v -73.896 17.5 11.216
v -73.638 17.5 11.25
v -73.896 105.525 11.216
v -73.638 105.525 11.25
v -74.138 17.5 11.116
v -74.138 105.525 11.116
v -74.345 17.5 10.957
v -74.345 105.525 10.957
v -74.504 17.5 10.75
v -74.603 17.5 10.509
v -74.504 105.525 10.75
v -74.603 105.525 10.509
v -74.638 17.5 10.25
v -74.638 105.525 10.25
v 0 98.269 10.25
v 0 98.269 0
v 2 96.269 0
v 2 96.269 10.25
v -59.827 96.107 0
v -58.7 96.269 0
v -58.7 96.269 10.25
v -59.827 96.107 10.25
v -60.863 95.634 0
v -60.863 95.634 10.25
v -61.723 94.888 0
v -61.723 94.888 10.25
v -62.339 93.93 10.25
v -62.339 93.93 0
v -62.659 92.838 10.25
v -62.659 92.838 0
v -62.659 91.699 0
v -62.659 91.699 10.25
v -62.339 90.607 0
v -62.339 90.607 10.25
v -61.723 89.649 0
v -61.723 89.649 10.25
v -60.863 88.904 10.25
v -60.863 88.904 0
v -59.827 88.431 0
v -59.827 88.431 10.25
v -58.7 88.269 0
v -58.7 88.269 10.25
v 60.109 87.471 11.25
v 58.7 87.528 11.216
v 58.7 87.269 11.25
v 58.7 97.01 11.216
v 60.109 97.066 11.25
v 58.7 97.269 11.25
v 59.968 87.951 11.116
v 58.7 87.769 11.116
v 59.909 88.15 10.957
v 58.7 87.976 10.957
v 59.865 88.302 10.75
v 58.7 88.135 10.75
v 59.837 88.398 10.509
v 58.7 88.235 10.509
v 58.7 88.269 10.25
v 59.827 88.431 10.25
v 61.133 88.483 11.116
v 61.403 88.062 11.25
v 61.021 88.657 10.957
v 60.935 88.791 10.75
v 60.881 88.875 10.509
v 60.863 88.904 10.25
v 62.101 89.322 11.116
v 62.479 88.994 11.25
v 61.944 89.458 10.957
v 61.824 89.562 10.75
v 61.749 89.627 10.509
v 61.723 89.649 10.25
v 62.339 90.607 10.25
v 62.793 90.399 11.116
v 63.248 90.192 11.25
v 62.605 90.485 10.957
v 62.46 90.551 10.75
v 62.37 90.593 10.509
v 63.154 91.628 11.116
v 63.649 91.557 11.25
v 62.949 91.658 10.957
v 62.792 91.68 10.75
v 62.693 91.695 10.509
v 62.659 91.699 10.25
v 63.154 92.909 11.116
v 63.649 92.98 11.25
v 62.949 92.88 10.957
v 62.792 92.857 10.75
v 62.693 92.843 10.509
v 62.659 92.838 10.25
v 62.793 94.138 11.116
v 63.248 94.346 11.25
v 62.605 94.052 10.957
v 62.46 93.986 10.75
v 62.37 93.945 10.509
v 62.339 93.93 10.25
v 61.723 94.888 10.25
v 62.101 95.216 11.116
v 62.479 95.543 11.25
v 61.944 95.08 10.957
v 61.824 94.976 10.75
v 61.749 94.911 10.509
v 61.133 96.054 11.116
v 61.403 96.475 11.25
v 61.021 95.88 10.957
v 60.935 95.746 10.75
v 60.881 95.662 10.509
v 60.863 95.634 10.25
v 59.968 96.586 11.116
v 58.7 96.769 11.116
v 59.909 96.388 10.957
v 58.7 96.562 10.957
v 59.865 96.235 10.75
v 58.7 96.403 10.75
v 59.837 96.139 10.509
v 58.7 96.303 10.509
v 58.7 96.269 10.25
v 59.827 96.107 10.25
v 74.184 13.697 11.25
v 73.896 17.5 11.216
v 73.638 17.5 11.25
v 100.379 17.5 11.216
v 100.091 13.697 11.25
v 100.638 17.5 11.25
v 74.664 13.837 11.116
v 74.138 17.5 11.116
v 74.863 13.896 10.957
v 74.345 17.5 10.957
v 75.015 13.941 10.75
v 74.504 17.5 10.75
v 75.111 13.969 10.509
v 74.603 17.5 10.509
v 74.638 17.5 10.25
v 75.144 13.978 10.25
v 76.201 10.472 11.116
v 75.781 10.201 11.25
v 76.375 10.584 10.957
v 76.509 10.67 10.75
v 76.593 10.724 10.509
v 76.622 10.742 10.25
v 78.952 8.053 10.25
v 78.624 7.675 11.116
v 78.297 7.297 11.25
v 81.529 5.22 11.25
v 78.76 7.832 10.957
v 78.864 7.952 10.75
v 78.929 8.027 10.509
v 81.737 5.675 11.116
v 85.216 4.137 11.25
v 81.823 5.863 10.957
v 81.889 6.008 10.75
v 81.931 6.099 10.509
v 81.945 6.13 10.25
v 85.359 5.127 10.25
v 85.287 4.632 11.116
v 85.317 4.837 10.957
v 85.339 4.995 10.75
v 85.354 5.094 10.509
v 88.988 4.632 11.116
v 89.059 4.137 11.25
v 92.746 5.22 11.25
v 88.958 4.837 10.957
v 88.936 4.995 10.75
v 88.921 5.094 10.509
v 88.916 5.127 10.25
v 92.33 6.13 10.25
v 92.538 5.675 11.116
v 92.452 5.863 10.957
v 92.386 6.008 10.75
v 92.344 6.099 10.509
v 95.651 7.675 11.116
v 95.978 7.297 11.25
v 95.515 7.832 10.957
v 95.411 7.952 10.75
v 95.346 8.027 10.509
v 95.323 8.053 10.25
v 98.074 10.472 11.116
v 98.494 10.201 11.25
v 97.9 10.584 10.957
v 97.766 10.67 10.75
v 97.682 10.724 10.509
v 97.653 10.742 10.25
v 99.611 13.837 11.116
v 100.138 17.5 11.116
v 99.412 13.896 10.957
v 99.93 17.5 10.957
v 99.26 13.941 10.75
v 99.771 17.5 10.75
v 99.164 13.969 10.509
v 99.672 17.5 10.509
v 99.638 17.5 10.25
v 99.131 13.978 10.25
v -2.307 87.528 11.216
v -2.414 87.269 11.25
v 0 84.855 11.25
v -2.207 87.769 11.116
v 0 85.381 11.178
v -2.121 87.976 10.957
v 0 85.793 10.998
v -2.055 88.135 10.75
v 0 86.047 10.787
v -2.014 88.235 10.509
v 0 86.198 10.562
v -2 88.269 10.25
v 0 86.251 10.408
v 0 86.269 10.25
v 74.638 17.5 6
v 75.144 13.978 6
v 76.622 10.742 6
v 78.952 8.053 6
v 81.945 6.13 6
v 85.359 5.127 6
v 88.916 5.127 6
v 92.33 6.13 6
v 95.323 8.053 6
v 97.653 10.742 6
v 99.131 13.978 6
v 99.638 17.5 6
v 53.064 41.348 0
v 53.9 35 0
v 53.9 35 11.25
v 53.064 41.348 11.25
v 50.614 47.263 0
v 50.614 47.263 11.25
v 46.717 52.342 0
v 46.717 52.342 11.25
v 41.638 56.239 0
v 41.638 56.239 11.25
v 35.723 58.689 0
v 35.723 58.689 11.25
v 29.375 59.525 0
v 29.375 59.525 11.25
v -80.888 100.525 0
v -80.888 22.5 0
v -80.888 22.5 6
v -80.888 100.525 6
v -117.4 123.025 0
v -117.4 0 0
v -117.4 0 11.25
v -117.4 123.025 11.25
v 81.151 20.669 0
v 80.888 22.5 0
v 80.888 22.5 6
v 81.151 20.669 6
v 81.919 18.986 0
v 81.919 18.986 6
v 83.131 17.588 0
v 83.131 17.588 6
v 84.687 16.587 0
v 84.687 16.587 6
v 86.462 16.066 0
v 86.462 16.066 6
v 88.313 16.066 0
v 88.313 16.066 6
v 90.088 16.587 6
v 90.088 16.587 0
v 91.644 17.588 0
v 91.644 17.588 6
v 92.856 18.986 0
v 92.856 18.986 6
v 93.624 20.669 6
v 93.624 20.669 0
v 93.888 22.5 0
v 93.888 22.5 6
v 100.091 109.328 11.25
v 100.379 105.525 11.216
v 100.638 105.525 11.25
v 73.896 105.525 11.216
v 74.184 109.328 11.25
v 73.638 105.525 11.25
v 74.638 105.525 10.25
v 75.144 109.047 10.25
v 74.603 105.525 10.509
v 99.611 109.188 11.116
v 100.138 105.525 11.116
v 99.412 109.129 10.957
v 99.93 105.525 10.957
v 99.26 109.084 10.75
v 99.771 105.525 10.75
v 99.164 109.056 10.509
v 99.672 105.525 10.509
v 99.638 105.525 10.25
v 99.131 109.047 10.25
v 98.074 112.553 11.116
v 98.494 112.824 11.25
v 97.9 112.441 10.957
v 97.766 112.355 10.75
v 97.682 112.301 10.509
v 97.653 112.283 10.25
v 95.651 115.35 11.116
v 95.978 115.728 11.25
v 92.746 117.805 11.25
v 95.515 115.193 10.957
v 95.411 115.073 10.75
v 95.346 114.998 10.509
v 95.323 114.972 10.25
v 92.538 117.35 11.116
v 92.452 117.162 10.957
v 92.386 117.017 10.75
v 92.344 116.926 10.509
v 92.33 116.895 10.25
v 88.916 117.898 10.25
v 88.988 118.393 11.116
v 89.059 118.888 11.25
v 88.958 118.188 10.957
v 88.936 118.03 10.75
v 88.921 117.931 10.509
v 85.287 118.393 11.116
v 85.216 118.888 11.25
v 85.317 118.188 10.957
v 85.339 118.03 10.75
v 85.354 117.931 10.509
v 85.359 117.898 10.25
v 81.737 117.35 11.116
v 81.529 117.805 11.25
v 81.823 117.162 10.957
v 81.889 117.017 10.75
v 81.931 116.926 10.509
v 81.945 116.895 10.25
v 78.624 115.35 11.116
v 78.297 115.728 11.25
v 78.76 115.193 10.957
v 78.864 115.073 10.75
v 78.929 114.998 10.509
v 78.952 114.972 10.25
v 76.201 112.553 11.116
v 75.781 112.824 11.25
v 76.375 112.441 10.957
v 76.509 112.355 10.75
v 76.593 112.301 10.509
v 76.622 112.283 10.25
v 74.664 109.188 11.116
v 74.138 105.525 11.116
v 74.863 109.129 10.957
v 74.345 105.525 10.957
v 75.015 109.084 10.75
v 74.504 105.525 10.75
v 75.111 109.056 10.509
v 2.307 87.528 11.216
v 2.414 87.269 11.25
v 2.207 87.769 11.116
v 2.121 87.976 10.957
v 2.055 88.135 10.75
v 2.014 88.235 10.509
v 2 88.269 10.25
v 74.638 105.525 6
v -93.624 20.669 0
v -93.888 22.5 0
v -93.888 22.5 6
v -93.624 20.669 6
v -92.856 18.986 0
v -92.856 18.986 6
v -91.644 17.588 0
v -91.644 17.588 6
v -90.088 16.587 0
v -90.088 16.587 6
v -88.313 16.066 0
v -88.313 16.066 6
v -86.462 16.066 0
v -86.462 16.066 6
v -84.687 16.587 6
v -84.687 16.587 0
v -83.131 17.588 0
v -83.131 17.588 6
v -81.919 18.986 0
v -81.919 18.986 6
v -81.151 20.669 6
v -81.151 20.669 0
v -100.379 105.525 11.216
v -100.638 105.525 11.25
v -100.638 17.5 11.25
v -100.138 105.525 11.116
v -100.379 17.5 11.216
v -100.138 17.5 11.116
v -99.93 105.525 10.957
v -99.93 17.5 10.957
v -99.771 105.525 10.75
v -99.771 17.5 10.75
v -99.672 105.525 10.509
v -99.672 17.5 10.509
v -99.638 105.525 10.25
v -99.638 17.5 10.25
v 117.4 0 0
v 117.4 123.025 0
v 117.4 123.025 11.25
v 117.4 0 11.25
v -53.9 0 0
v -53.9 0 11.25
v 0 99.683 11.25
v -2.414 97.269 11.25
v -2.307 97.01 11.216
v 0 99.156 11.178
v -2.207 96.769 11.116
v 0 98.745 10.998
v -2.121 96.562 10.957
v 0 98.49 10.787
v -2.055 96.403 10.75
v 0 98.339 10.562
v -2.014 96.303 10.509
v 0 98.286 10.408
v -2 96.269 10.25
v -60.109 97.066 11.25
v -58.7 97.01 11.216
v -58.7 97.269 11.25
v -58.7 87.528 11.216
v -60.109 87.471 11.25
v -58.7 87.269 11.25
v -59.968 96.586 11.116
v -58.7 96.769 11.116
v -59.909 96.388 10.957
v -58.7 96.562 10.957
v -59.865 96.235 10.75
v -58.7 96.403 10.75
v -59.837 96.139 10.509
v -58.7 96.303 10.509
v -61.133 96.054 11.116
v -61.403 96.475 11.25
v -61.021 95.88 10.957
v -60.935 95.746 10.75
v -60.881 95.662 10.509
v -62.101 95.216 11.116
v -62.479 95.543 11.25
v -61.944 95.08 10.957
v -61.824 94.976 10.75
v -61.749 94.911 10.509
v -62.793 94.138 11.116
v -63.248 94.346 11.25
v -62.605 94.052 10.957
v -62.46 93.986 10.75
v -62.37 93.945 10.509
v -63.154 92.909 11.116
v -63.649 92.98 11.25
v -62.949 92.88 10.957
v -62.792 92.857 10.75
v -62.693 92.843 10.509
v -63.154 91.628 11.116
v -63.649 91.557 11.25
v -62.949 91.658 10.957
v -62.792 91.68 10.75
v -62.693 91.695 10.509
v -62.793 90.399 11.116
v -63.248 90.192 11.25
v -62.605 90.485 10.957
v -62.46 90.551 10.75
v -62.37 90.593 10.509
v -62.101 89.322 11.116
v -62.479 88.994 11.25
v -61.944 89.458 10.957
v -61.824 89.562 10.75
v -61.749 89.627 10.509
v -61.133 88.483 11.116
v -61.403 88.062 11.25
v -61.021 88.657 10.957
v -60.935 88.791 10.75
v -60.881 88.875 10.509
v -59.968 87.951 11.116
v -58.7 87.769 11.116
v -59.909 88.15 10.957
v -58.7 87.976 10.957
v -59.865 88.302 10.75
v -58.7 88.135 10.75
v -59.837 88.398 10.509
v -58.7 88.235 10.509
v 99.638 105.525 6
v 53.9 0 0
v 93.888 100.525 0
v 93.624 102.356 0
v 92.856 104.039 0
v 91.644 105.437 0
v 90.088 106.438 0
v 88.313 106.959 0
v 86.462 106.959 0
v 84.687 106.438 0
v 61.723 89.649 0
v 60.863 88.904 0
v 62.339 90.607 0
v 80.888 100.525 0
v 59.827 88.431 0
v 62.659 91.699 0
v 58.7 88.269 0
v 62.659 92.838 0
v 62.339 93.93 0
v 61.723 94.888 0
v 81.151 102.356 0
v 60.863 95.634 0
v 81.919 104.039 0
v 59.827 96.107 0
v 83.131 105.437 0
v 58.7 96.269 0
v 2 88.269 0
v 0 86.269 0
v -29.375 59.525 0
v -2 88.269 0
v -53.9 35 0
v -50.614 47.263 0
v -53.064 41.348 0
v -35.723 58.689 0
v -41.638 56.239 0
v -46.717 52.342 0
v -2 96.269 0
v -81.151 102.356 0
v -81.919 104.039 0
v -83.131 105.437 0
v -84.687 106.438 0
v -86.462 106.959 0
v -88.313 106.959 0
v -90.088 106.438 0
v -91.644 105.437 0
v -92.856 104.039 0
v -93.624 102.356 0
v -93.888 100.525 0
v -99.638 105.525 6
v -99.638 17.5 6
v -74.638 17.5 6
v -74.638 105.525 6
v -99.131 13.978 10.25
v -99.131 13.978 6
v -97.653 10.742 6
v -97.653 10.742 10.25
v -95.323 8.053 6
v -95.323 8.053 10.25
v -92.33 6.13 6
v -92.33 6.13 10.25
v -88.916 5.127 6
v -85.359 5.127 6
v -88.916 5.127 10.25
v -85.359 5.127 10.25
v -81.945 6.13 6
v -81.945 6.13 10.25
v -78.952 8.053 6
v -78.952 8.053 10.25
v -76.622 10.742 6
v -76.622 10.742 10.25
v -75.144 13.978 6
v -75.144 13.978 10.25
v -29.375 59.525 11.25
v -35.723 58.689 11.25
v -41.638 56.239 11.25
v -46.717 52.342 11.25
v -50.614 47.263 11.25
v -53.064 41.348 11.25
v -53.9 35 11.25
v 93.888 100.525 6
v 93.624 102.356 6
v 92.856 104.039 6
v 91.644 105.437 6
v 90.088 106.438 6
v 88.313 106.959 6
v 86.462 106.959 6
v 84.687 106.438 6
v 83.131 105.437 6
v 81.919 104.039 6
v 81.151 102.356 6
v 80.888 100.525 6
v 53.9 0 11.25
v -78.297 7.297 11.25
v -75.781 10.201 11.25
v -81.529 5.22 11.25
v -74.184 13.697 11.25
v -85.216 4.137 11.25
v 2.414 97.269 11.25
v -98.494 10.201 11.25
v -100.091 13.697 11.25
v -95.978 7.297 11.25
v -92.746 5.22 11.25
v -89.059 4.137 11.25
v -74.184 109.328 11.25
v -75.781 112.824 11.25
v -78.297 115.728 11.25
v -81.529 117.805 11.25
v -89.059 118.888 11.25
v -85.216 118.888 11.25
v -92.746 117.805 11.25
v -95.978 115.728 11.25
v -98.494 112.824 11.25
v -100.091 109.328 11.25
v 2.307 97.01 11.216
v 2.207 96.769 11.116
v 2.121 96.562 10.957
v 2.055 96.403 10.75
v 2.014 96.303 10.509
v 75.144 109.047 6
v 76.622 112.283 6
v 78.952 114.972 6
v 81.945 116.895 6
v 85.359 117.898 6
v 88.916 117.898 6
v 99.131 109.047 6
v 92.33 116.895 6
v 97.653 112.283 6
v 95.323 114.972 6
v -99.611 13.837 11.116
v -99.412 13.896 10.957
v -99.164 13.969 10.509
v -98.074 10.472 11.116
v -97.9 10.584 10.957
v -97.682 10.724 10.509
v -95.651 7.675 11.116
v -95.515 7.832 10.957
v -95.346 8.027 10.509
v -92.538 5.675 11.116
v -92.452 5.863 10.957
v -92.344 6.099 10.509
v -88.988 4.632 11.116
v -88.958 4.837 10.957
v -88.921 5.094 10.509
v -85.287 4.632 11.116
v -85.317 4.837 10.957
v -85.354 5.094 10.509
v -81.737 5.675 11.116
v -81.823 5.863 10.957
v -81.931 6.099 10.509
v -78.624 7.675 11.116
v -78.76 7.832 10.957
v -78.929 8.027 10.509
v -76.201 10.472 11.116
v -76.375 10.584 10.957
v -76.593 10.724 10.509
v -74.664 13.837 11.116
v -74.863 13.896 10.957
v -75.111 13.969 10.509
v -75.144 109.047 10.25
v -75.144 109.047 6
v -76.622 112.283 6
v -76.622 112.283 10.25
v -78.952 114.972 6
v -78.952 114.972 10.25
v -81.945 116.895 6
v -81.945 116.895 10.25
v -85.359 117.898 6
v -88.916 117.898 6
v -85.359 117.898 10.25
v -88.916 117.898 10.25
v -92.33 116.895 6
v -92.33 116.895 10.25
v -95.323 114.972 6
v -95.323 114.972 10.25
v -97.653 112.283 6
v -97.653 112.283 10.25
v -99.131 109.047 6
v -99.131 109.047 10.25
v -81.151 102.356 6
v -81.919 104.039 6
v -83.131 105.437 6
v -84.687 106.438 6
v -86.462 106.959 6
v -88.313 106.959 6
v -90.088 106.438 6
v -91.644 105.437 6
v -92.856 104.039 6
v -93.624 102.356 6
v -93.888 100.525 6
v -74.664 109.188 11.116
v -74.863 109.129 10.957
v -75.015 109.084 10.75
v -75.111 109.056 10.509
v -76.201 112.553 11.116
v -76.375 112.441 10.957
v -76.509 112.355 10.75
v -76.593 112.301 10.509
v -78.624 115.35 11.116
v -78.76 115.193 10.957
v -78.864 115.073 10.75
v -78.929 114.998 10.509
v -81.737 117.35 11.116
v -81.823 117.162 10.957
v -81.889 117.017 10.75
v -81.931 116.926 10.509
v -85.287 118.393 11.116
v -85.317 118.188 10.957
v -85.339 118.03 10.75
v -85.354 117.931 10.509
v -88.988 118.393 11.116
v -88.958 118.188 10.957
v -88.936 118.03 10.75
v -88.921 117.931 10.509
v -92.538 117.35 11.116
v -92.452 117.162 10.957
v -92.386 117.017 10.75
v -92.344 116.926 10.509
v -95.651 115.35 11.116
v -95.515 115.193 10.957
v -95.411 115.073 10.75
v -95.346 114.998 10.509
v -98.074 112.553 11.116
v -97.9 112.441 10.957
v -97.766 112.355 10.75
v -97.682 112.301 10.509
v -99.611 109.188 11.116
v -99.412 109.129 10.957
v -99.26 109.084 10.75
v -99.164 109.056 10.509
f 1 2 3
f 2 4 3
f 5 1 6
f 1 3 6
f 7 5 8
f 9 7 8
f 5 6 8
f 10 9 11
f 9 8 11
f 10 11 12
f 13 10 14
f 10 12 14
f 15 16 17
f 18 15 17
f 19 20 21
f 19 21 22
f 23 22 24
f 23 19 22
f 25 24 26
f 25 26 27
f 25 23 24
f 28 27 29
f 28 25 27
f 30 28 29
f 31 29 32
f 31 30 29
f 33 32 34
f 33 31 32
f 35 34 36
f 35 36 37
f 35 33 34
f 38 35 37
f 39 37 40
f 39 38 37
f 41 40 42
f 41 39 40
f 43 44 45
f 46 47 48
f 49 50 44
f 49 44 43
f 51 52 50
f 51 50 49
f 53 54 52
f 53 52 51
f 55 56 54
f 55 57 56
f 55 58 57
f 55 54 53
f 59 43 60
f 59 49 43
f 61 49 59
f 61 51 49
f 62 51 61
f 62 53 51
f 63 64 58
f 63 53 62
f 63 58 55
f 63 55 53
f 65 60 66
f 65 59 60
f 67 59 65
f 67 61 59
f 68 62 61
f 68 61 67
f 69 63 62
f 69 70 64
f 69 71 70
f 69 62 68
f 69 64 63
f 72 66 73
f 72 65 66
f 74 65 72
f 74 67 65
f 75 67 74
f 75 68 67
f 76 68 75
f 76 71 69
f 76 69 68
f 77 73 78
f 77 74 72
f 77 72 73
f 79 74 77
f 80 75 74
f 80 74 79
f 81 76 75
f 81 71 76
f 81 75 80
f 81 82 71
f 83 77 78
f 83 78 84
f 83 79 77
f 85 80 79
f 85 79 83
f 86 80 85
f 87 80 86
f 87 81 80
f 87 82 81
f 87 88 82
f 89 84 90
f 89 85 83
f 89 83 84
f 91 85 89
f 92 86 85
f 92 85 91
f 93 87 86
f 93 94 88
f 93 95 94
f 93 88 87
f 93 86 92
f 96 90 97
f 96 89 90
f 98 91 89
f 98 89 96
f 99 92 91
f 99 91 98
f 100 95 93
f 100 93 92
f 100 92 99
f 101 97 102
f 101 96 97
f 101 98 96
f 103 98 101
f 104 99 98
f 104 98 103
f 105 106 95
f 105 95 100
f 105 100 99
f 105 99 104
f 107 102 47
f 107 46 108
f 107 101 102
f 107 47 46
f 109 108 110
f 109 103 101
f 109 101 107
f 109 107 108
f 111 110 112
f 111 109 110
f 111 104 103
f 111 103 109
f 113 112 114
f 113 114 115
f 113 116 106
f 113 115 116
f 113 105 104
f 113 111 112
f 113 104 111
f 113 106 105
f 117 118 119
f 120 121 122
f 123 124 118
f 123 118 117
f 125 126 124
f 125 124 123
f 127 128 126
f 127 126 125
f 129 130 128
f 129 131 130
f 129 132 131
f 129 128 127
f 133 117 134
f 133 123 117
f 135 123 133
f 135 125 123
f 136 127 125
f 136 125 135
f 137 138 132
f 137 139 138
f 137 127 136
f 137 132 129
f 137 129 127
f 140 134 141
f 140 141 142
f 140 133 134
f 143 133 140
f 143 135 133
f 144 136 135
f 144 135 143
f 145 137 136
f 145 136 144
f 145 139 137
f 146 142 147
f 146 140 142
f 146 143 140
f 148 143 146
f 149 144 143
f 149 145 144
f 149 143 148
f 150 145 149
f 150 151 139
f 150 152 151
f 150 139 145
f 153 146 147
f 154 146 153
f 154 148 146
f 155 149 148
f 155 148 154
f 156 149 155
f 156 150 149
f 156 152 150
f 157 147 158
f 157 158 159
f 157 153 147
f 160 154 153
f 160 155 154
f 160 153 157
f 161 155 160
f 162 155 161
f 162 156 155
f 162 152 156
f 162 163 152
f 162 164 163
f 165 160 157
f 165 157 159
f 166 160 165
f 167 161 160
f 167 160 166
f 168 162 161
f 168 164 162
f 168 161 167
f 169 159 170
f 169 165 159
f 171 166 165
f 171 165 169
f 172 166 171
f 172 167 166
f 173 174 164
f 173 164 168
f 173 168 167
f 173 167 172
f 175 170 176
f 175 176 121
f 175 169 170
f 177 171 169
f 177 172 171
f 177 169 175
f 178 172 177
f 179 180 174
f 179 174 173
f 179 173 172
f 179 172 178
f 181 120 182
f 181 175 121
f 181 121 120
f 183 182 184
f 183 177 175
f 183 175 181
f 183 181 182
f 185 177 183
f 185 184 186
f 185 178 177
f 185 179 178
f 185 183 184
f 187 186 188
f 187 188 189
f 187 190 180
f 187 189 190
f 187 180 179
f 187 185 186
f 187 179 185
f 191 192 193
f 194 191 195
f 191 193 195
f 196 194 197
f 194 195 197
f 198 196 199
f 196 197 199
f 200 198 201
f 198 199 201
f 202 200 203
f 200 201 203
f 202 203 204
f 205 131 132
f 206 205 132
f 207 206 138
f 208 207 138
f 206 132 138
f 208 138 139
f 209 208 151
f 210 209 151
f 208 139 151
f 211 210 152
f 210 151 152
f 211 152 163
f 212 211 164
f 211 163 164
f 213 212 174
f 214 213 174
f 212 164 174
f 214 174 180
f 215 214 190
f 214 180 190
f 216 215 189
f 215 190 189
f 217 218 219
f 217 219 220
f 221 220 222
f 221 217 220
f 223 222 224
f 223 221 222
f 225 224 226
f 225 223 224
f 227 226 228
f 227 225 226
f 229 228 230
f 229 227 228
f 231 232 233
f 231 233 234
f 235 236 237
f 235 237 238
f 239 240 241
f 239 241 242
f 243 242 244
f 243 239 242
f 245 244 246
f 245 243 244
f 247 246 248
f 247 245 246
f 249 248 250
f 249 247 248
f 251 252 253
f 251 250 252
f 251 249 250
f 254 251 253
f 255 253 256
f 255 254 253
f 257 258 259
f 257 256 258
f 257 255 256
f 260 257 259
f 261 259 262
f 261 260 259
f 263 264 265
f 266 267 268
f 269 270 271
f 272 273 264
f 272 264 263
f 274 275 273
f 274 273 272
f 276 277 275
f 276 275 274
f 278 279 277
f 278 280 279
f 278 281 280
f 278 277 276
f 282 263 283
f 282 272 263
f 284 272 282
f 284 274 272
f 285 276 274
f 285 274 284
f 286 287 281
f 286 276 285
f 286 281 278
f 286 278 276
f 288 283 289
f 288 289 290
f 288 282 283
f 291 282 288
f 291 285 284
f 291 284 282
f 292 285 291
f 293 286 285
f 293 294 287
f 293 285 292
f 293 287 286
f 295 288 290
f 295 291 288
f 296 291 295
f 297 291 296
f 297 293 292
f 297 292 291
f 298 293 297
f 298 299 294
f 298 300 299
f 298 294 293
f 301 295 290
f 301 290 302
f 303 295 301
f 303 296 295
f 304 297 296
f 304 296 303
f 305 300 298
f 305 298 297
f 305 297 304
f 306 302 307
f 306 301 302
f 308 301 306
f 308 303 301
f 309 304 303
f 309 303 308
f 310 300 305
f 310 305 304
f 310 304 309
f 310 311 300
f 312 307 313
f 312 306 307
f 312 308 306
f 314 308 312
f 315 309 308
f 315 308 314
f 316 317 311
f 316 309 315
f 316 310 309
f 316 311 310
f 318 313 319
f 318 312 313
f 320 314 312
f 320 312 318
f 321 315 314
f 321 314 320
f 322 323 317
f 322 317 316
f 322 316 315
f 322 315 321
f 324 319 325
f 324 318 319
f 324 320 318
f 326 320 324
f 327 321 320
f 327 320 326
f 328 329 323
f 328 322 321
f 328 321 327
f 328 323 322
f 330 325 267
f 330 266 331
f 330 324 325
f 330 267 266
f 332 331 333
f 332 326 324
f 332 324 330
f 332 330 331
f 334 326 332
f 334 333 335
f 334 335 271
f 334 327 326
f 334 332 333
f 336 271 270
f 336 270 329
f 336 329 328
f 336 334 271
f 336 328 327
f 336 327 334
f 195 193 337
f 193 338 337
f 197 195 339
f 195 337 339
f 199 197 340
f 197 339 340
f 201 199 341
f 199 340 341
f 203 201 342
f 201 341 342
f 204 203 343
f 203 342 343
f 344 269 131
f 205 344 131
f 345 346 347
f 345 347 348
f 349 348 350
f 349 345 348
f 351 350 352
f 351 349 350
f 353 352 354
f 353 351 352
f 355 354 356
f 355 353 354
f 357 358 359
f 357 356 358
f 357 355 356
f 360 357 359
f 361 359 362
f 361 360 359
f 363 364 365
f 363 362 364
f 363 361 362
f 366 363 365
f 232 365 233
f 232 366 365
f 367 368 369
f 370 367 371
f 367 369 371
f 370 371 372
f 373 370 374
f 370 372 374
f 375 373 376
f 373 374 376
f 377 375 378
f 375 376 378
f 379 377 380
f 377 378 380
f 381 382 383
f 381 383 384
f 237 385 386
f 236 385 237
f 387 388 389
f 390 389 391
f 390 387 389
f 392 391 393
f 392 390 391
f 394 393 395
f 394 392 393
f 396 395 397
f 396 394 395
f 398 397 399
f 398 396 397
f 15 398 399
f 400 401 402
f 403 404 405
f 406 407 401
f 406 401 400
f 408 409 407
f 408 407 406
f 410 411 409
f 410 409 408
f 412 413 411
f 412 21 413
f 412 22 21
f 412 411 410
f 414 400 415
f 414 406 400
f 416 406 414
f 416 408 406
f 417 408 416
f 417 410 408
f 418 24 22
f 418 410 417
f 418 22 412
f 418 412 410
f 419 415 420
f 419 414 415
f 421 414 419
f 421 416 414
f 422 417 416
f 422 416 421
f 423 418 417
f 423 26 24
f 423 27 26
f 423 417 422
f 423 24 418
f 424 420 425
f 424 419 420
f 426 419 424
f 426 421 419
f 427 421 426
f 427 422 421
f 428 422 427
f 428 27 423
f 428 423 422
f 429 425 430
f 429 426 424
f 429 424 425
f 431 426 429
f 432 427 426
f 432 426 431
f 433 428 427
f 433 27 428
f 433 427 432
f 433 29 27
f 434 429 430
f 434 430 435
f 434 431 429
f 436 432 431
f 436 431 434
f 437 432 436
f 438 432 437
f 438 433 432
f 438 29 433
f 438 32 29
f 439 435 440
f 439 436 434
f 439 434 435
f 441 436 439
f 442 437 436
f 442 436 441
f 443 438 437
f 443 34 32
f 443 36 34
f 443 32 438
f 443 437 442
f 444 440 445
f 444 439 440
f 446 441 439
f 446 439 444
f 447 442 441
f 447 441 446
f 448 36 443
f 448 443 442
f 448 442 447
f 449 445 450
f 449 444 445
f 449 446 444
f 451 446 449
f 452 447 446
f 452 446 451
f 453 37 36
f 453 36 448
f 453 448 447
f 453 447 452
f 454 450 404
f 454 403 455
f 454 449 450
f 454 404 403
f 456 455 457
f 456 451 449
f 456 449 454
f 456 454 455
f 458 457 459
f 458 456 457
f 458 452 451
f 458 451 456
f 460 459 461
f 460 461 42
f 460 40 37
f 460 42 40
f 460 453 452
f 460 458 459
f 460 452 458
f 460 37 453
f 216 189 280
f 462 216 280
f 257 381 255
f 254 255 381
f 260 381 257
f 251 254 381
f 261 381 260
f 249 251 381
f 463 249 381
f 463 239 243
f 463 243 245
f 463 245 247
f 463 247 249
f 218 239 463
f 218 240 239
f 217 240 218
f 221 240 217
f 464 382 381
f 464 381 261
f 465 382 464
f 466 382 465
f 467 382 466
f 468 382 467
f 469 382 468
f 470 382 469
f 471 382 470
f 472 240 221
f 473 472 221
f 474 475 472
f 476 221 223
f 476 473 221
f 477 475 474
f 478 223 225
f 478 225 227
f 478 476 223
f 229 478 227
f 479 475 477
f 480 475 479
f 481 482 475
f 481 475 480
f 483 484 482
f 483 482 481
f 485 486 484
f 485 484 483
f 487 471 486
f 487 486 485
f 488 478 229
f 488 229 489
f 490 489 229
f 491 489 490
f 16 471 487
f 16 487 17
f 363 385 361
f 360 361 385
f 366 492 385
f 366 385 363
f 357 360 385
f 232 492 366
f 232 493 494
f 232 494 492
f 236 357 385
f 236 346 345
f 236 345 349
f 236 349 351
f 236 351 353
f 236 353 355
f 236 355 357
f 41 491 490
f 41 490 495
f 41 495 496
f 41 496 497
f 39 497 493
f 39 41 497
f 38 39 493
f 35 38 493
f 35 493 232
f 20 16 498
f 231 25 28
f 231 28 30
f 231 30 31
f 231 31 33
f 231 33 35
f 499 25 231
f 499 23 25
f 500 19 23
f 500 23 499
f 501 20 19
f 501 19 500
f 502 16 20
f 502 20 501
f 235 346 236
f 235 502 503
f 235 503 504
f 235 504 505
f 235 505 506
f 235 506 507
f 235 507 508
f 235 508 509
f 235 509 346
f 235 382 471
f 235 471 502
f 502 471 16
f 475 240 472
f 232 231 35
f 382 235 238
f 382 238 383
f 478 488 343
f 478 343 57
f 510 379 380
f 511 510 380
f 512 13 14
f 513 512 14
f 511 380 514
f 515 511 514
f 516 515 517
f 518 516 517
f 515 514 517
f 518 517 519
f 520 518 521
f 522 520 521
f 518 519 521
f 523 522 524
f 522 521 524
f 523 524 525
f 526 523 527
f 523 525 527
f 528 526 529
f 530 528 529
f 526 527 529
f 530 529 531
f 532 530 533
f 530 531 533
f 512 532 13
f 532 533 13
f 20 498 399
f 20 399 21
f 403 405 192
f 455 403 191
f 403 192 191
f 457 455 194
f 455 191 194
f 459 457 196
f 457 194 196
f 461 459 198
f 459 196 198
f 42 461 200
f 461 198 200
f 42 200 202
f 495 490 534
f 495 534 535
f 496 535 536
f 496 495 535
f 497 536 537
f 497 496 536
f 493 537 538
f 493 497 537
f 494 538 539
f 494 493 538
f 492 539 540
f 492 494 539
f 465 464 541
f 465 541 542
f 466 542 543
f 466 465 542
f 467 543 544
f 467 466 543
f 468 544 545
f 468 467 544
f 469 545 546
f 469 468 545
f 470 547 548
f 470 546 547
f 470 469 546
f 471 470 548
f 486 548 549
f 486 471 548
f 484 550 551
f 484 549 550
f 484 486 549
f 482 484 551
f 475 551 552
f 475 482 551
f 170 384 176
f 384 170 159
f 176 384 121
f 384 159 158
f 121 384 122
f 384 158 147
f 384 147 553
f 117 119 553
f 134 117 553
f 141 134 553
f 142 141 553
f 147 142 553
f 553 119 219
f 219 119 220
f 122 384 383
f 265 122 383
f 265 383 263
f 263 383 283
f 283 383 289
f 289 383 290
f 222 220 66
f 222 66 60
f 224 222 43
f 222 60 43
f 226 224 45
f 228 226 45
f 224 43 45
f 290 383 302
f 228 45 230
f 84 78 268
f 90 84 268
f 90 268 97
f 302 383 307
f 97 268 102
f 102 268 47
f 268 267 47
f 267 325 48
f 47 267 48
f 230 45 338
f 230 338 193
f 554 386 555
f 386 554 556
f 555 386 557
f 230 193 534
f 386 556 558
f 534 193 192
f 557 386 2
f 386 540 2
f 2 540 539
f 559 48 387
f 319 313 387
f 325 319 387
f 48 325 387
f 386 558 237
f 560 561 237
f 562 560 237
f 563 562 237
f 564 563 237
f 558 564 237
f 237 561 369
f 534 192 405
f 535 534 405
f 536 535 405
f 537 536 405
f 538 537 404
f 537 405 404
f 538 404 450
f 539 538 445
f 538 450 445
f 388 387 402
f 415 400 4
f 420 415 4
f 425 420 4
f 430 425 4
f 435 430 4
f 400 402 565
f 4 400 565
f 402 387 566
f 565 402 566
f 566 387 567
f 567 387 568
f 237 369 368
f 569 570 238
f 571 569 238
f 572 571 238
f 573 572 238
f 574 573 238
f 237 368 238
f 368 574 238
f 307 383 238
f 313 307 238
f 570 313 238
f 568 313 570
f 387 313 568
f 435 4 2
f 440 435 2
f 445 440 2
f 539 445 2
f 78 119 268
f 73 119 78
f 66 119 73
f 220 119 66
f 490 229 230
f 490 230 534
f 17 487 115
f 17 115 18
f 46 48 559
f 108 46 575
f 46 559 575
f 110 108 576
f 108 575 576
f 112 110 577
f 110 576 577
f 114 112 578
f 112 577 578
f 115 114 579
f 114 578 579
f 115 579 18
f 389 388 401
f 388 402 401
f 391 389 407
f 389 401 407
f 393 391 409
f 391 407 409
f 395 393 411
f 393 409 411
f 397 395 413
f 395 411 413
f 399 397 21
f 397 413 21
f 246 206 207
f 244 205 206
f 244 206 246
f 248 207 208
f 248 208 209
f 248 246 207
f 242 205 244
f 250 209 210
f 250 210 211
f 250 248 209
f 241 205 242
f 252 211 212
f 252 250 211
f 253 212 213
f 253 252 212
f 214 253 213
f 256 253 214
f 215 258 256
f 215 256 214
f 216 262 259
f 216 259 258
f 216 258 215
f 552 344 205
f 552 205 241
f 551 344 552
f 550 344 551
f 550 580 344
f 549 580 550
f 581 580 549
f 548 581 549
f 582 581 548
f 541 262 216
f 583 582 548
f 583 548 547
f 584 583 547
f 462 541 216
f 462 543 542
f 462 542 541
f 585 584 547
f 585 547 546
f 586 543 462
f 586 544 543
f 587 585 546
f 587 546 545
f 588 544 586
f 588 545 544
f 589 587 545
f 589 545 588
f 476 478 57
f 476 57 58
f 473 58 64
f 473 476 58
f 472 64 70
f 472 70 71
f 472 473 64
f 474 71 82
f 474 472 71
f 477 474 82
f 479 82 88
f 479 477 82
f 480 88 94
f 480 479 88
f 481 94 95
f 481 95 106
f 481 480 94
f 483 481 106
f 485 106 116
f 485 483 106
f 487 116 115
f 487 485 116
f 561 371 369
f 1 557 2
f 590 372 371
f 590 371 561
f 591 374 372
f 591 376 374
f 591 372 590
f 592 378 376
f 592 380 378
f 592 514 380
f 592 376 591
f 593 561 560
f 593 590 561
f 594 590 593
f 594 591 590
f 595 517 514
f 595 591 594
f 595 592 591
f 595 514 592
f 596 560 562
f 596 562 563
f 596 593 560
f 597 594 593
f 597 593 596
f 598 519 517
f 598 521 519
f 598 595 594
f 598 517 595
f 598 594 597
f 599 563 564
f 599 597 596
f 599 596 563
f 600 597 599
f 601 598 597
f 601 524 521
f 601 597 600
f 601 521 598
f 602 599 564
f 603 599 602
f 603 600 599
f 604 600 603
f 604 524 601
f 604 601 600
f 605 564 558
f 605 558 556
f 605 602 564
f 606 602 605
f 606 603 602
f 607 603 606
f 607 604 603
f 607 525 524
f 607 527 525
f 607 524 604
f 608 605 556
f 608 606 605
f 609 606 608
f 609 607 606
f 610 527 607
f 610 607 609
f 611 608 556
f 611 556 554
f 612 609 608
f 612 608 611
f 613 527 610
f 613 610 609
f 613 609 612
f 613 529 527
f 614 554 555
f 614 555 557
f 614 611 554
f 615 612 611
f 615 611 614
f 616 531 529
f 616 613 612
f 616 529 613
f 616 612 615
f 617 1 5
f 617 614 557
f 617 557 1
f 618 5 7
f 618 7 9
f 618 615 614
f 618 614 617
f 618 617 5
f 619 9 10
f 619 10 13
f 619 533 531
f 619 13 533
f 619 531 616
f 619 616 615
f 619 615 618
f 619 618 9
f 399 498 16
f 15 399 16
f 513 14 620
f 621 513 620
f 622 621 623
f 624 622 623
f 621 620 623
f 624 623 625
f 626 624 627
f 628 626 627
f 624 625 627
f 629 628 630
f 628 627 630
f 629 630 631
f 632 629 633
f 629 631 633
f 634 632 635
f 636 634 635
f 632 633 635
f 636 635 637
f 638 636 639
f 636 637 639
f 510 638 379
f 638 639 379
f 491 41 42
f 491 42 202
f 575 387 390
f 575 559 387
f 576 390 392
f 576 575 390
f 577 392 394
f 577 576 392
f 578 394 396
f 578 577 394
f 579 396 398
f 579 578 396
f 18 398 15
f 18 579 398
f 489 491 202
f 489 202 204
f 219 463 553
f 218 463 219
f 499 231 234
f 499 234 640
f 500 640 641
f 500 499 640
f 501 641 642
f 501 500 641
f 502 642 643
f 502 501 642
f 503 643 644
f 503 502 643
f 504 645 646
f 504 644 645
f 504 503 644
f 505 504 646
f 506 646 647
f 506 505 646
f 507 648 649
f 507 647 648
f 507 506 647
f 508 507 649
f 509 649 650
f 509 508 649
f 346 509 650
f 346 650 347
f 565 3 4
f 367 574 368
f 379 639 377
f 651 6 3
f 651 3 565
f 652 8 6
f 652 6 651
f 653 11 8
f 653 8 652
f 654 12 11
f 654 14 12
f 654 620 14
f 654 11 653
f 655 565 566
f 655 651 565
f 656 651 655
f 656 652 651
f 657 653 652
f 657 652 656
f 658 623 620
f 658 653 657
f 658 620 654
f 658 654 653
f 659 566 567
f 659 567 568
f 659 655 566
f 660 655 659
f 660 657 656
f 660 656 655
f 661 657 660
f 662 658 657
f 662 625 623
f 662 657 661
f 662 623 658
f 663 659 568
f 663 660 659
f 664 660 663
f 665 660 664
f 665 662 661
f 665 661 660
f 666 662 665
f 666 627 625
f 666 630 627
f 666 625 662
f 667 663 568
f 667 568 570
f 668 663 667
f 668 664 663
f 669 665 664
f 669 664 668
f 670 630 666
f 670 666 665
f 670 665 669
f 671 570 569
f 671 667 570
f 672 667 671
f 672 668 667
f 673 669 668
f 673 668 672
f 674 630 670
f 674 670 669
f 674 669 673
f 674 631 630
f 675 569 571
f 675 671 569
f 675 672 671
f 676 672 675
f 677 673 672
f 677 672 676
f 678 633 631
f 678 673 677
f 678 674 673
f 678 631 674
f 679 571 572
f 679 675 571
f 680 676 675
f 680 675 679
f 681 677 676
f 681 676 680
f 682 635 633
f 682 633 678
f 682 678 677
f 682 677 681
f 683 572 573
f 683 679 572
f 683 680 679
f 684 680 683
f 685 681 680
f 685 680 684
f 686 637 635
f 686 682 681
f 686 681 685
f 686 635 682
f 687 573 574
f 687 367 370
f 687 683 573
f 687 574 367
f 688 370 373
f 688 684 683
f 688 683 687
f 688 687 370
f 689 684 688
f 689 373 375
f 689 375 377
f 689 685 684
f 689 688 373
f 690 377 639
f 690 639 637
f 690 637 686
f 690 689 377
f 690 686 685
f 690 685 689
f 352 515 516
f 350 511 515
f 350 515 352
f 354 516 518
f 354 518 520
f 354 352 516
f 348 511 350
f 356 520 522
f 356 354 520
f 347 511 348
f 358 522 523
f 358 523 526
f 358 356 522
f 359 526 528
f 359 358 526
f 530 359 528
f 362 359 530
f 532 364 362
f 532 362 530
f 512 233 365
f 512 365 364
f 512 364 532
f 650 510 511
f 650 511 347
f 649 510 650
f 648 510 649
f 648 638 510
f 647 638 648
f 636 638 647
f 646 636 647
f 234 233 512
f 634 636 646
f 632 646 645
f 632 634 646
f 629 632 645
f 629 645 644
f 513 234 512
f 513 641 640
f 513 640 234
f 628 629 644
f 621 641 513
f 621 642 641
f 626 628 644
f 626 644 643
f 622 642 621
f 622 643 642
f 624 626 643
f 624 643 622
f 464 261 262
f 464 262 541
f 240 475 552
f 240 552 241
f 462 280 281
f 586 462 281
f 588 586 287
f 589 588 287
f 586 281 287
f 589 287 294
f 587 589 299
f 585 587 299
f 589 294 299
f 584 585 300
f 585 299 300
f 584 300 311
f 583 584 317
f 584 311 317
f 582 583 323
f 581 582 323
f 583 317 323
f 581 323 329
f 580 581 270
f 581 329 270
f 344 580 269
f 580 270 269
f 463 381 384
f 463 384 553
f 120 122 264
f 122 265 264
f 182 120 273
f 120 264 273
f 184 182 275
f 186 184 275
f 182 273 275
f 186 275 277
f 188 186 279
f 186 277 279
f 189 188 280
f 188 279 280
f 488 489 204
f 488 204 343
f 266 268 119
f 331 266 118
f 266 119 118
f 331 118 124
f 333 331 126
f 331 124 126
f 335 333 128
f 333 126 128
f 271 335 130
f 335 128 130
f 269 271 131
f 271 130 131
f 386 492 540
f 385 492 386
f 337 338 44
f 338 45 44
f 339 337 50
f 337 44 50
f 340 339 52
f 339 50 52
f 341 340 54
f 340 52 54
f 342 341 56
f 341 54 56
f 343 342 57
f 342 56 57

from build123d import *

# Parameters (mm, degrees)
PAD_DEPTH    = 11.25
POCKET_DEPTH = 5.25
FILLET_R     = 1


with BuildPart() as part:
    # Sketch → Pad (new body)
    with BuildSketch(Plane.XY):
        with BuildLine():
            Line((117.4, 123.025), (117.4, 0))
            Line((117.4, 0), (53.9, 0))
            Line((53.9, 0), (53.9, 35))
            ThreePointArc((53.9, 35), (46.716794, 52.341794), (29.375, 59.525))
            Line((29.375, 59.525), (-29.375, 59.525))
            ThreePointArc((-29.375, 59.525), (-46.716794, 52.341794), (-53.9, 35))
            Line((-53.9, 35), (-53.9, 0))
            Line((-53.9, 0), (-117.4, 0))
            Line((-117.4, 0), (-117.4, 123.025))
            Line((-117.4, 123.025), (117.4, 123.025))
        make_face()
        with BuildLine():
            ThreePointArc((-80.8875, 100.525), (-87.3875, 107.025), (-93.8875, 100.525))
            Line((-93.8875, 100.525), (-93.8875, 22.5))
            ThreePointArc((-93.8875, 22.5), (-87.3875, 16), (-80.8875, 22.5))
            Line((-80.8875, 22.5), (-80.8875, 100.525))
        make_face(mode=Mode.SUBTRACT)
        with BuildLine():
            ThreePointArc((93.8875, 100.525), (87.3875, 107.025), (80.8875, 100.525))
            Line((80.8875, 100.525), (80.8875, 22.5))
            ThreePointArc((80.8875, 22.5), (87.3875, 16), (93.8875, 22.5))
            Line((93.8875, 22.5), (93.8875, 100.525))
        make_face(mode=Mode.SUBTRACT)
        with BuildLine():
            ThreePointArc((-58.7, 96.26875), (-62.7, 92.26875), (-58.7, 88.26875))
            Line((-58.7, 88.26875), (-2, 88.26875))
            Line((-2, 88.26875), (0, 86.26875))
            Line((0, 86.26875), (2, 88.26875))
            Line((2, 88.26875), (58.7, 88.26875))
            ThreePointArc((58.7, 88.26875), (62.7, 92.26875), (58.7, 96.26875))
            Line((58.7, 96.26875), (2, 96.26875))
            Line((0, 98.26875), (2, 96.26875))
            Line((-2, 96.26875), (0, 98.26875))
            Line((-2, 96.26875), (-58.7, 96.26875))
        make_face(mode=Mode.SUBTRACT)
    extrude(amount=PAD_DEPTH)

    # Sketch001 (on Face30 of Pad) → Pocket (cut)
    with BuildSketch(Plane.XY.offset(11.25)):
        with BuildLine():
            ThreePointArc((-74.6375, 105.525), (-87.1375, 118.025), (-99.6375, 105.525))
            Line((-99.6375, 105.525), (-99.6375, 17.5))
            ThreePointArc((-99.6375, 17.5), (-87.1375, 5), (-74.6375, 17.5))
            Line((-74.6375, 17.5), (-74.6375, 105.525))
        make_face()
        with BuildLine():
            ThreePointArc((99.6375, 105.525), (87.1375, 118.025), (74.6375, 105.525))
            Line((74.6375, 105.525), (74.6375, 17.5))
            ThreePointArc((74.6375, 17.5), (87.1375, 5), (99.6375, 17.5))
            Line((99.6375, 17.5), (99.6375, 105.525))
        make_face()
    extrude(amount=-POCKET_DEPTH, mode=Mode.SUBTRACT)

    # Fillet
    fillet_edges = [part.edges().sort_by_distance(p)[0] for p in [
        (30.35, 96.26875, 11.25),
        (62.7, 92.26875, 11.25),
        (30.35, 88.26875, 11.25),
        (1, 87.26875, 11.25),
        (-1, 87.26875, 11.25),
        (1, 97.26875, 11.25),
        (-1, 97.26875, 11.25),
        (-30.35, 96.26875, 11.25),
        (-30.35, 88.26875, 11.25),
        (-62.7, 92.26875, 11.25),
        (-74.6375, 61.5125, 11.25),
        (-87.1375, 118.025, 11.25),
        (-99.6375, 61.5125, 11.25),
        (87.1375, 118.025, 11.25),
        (74.6375, 61.5125, 11.25),
        (99.6375, 61.5125, 11.25),
        (87.1375, 5, 11.25),
        (-87.1375, 5, 11.25),
    ]]
    fillet(fillet_edges, radius=FILLET_R)


solid = part.part
